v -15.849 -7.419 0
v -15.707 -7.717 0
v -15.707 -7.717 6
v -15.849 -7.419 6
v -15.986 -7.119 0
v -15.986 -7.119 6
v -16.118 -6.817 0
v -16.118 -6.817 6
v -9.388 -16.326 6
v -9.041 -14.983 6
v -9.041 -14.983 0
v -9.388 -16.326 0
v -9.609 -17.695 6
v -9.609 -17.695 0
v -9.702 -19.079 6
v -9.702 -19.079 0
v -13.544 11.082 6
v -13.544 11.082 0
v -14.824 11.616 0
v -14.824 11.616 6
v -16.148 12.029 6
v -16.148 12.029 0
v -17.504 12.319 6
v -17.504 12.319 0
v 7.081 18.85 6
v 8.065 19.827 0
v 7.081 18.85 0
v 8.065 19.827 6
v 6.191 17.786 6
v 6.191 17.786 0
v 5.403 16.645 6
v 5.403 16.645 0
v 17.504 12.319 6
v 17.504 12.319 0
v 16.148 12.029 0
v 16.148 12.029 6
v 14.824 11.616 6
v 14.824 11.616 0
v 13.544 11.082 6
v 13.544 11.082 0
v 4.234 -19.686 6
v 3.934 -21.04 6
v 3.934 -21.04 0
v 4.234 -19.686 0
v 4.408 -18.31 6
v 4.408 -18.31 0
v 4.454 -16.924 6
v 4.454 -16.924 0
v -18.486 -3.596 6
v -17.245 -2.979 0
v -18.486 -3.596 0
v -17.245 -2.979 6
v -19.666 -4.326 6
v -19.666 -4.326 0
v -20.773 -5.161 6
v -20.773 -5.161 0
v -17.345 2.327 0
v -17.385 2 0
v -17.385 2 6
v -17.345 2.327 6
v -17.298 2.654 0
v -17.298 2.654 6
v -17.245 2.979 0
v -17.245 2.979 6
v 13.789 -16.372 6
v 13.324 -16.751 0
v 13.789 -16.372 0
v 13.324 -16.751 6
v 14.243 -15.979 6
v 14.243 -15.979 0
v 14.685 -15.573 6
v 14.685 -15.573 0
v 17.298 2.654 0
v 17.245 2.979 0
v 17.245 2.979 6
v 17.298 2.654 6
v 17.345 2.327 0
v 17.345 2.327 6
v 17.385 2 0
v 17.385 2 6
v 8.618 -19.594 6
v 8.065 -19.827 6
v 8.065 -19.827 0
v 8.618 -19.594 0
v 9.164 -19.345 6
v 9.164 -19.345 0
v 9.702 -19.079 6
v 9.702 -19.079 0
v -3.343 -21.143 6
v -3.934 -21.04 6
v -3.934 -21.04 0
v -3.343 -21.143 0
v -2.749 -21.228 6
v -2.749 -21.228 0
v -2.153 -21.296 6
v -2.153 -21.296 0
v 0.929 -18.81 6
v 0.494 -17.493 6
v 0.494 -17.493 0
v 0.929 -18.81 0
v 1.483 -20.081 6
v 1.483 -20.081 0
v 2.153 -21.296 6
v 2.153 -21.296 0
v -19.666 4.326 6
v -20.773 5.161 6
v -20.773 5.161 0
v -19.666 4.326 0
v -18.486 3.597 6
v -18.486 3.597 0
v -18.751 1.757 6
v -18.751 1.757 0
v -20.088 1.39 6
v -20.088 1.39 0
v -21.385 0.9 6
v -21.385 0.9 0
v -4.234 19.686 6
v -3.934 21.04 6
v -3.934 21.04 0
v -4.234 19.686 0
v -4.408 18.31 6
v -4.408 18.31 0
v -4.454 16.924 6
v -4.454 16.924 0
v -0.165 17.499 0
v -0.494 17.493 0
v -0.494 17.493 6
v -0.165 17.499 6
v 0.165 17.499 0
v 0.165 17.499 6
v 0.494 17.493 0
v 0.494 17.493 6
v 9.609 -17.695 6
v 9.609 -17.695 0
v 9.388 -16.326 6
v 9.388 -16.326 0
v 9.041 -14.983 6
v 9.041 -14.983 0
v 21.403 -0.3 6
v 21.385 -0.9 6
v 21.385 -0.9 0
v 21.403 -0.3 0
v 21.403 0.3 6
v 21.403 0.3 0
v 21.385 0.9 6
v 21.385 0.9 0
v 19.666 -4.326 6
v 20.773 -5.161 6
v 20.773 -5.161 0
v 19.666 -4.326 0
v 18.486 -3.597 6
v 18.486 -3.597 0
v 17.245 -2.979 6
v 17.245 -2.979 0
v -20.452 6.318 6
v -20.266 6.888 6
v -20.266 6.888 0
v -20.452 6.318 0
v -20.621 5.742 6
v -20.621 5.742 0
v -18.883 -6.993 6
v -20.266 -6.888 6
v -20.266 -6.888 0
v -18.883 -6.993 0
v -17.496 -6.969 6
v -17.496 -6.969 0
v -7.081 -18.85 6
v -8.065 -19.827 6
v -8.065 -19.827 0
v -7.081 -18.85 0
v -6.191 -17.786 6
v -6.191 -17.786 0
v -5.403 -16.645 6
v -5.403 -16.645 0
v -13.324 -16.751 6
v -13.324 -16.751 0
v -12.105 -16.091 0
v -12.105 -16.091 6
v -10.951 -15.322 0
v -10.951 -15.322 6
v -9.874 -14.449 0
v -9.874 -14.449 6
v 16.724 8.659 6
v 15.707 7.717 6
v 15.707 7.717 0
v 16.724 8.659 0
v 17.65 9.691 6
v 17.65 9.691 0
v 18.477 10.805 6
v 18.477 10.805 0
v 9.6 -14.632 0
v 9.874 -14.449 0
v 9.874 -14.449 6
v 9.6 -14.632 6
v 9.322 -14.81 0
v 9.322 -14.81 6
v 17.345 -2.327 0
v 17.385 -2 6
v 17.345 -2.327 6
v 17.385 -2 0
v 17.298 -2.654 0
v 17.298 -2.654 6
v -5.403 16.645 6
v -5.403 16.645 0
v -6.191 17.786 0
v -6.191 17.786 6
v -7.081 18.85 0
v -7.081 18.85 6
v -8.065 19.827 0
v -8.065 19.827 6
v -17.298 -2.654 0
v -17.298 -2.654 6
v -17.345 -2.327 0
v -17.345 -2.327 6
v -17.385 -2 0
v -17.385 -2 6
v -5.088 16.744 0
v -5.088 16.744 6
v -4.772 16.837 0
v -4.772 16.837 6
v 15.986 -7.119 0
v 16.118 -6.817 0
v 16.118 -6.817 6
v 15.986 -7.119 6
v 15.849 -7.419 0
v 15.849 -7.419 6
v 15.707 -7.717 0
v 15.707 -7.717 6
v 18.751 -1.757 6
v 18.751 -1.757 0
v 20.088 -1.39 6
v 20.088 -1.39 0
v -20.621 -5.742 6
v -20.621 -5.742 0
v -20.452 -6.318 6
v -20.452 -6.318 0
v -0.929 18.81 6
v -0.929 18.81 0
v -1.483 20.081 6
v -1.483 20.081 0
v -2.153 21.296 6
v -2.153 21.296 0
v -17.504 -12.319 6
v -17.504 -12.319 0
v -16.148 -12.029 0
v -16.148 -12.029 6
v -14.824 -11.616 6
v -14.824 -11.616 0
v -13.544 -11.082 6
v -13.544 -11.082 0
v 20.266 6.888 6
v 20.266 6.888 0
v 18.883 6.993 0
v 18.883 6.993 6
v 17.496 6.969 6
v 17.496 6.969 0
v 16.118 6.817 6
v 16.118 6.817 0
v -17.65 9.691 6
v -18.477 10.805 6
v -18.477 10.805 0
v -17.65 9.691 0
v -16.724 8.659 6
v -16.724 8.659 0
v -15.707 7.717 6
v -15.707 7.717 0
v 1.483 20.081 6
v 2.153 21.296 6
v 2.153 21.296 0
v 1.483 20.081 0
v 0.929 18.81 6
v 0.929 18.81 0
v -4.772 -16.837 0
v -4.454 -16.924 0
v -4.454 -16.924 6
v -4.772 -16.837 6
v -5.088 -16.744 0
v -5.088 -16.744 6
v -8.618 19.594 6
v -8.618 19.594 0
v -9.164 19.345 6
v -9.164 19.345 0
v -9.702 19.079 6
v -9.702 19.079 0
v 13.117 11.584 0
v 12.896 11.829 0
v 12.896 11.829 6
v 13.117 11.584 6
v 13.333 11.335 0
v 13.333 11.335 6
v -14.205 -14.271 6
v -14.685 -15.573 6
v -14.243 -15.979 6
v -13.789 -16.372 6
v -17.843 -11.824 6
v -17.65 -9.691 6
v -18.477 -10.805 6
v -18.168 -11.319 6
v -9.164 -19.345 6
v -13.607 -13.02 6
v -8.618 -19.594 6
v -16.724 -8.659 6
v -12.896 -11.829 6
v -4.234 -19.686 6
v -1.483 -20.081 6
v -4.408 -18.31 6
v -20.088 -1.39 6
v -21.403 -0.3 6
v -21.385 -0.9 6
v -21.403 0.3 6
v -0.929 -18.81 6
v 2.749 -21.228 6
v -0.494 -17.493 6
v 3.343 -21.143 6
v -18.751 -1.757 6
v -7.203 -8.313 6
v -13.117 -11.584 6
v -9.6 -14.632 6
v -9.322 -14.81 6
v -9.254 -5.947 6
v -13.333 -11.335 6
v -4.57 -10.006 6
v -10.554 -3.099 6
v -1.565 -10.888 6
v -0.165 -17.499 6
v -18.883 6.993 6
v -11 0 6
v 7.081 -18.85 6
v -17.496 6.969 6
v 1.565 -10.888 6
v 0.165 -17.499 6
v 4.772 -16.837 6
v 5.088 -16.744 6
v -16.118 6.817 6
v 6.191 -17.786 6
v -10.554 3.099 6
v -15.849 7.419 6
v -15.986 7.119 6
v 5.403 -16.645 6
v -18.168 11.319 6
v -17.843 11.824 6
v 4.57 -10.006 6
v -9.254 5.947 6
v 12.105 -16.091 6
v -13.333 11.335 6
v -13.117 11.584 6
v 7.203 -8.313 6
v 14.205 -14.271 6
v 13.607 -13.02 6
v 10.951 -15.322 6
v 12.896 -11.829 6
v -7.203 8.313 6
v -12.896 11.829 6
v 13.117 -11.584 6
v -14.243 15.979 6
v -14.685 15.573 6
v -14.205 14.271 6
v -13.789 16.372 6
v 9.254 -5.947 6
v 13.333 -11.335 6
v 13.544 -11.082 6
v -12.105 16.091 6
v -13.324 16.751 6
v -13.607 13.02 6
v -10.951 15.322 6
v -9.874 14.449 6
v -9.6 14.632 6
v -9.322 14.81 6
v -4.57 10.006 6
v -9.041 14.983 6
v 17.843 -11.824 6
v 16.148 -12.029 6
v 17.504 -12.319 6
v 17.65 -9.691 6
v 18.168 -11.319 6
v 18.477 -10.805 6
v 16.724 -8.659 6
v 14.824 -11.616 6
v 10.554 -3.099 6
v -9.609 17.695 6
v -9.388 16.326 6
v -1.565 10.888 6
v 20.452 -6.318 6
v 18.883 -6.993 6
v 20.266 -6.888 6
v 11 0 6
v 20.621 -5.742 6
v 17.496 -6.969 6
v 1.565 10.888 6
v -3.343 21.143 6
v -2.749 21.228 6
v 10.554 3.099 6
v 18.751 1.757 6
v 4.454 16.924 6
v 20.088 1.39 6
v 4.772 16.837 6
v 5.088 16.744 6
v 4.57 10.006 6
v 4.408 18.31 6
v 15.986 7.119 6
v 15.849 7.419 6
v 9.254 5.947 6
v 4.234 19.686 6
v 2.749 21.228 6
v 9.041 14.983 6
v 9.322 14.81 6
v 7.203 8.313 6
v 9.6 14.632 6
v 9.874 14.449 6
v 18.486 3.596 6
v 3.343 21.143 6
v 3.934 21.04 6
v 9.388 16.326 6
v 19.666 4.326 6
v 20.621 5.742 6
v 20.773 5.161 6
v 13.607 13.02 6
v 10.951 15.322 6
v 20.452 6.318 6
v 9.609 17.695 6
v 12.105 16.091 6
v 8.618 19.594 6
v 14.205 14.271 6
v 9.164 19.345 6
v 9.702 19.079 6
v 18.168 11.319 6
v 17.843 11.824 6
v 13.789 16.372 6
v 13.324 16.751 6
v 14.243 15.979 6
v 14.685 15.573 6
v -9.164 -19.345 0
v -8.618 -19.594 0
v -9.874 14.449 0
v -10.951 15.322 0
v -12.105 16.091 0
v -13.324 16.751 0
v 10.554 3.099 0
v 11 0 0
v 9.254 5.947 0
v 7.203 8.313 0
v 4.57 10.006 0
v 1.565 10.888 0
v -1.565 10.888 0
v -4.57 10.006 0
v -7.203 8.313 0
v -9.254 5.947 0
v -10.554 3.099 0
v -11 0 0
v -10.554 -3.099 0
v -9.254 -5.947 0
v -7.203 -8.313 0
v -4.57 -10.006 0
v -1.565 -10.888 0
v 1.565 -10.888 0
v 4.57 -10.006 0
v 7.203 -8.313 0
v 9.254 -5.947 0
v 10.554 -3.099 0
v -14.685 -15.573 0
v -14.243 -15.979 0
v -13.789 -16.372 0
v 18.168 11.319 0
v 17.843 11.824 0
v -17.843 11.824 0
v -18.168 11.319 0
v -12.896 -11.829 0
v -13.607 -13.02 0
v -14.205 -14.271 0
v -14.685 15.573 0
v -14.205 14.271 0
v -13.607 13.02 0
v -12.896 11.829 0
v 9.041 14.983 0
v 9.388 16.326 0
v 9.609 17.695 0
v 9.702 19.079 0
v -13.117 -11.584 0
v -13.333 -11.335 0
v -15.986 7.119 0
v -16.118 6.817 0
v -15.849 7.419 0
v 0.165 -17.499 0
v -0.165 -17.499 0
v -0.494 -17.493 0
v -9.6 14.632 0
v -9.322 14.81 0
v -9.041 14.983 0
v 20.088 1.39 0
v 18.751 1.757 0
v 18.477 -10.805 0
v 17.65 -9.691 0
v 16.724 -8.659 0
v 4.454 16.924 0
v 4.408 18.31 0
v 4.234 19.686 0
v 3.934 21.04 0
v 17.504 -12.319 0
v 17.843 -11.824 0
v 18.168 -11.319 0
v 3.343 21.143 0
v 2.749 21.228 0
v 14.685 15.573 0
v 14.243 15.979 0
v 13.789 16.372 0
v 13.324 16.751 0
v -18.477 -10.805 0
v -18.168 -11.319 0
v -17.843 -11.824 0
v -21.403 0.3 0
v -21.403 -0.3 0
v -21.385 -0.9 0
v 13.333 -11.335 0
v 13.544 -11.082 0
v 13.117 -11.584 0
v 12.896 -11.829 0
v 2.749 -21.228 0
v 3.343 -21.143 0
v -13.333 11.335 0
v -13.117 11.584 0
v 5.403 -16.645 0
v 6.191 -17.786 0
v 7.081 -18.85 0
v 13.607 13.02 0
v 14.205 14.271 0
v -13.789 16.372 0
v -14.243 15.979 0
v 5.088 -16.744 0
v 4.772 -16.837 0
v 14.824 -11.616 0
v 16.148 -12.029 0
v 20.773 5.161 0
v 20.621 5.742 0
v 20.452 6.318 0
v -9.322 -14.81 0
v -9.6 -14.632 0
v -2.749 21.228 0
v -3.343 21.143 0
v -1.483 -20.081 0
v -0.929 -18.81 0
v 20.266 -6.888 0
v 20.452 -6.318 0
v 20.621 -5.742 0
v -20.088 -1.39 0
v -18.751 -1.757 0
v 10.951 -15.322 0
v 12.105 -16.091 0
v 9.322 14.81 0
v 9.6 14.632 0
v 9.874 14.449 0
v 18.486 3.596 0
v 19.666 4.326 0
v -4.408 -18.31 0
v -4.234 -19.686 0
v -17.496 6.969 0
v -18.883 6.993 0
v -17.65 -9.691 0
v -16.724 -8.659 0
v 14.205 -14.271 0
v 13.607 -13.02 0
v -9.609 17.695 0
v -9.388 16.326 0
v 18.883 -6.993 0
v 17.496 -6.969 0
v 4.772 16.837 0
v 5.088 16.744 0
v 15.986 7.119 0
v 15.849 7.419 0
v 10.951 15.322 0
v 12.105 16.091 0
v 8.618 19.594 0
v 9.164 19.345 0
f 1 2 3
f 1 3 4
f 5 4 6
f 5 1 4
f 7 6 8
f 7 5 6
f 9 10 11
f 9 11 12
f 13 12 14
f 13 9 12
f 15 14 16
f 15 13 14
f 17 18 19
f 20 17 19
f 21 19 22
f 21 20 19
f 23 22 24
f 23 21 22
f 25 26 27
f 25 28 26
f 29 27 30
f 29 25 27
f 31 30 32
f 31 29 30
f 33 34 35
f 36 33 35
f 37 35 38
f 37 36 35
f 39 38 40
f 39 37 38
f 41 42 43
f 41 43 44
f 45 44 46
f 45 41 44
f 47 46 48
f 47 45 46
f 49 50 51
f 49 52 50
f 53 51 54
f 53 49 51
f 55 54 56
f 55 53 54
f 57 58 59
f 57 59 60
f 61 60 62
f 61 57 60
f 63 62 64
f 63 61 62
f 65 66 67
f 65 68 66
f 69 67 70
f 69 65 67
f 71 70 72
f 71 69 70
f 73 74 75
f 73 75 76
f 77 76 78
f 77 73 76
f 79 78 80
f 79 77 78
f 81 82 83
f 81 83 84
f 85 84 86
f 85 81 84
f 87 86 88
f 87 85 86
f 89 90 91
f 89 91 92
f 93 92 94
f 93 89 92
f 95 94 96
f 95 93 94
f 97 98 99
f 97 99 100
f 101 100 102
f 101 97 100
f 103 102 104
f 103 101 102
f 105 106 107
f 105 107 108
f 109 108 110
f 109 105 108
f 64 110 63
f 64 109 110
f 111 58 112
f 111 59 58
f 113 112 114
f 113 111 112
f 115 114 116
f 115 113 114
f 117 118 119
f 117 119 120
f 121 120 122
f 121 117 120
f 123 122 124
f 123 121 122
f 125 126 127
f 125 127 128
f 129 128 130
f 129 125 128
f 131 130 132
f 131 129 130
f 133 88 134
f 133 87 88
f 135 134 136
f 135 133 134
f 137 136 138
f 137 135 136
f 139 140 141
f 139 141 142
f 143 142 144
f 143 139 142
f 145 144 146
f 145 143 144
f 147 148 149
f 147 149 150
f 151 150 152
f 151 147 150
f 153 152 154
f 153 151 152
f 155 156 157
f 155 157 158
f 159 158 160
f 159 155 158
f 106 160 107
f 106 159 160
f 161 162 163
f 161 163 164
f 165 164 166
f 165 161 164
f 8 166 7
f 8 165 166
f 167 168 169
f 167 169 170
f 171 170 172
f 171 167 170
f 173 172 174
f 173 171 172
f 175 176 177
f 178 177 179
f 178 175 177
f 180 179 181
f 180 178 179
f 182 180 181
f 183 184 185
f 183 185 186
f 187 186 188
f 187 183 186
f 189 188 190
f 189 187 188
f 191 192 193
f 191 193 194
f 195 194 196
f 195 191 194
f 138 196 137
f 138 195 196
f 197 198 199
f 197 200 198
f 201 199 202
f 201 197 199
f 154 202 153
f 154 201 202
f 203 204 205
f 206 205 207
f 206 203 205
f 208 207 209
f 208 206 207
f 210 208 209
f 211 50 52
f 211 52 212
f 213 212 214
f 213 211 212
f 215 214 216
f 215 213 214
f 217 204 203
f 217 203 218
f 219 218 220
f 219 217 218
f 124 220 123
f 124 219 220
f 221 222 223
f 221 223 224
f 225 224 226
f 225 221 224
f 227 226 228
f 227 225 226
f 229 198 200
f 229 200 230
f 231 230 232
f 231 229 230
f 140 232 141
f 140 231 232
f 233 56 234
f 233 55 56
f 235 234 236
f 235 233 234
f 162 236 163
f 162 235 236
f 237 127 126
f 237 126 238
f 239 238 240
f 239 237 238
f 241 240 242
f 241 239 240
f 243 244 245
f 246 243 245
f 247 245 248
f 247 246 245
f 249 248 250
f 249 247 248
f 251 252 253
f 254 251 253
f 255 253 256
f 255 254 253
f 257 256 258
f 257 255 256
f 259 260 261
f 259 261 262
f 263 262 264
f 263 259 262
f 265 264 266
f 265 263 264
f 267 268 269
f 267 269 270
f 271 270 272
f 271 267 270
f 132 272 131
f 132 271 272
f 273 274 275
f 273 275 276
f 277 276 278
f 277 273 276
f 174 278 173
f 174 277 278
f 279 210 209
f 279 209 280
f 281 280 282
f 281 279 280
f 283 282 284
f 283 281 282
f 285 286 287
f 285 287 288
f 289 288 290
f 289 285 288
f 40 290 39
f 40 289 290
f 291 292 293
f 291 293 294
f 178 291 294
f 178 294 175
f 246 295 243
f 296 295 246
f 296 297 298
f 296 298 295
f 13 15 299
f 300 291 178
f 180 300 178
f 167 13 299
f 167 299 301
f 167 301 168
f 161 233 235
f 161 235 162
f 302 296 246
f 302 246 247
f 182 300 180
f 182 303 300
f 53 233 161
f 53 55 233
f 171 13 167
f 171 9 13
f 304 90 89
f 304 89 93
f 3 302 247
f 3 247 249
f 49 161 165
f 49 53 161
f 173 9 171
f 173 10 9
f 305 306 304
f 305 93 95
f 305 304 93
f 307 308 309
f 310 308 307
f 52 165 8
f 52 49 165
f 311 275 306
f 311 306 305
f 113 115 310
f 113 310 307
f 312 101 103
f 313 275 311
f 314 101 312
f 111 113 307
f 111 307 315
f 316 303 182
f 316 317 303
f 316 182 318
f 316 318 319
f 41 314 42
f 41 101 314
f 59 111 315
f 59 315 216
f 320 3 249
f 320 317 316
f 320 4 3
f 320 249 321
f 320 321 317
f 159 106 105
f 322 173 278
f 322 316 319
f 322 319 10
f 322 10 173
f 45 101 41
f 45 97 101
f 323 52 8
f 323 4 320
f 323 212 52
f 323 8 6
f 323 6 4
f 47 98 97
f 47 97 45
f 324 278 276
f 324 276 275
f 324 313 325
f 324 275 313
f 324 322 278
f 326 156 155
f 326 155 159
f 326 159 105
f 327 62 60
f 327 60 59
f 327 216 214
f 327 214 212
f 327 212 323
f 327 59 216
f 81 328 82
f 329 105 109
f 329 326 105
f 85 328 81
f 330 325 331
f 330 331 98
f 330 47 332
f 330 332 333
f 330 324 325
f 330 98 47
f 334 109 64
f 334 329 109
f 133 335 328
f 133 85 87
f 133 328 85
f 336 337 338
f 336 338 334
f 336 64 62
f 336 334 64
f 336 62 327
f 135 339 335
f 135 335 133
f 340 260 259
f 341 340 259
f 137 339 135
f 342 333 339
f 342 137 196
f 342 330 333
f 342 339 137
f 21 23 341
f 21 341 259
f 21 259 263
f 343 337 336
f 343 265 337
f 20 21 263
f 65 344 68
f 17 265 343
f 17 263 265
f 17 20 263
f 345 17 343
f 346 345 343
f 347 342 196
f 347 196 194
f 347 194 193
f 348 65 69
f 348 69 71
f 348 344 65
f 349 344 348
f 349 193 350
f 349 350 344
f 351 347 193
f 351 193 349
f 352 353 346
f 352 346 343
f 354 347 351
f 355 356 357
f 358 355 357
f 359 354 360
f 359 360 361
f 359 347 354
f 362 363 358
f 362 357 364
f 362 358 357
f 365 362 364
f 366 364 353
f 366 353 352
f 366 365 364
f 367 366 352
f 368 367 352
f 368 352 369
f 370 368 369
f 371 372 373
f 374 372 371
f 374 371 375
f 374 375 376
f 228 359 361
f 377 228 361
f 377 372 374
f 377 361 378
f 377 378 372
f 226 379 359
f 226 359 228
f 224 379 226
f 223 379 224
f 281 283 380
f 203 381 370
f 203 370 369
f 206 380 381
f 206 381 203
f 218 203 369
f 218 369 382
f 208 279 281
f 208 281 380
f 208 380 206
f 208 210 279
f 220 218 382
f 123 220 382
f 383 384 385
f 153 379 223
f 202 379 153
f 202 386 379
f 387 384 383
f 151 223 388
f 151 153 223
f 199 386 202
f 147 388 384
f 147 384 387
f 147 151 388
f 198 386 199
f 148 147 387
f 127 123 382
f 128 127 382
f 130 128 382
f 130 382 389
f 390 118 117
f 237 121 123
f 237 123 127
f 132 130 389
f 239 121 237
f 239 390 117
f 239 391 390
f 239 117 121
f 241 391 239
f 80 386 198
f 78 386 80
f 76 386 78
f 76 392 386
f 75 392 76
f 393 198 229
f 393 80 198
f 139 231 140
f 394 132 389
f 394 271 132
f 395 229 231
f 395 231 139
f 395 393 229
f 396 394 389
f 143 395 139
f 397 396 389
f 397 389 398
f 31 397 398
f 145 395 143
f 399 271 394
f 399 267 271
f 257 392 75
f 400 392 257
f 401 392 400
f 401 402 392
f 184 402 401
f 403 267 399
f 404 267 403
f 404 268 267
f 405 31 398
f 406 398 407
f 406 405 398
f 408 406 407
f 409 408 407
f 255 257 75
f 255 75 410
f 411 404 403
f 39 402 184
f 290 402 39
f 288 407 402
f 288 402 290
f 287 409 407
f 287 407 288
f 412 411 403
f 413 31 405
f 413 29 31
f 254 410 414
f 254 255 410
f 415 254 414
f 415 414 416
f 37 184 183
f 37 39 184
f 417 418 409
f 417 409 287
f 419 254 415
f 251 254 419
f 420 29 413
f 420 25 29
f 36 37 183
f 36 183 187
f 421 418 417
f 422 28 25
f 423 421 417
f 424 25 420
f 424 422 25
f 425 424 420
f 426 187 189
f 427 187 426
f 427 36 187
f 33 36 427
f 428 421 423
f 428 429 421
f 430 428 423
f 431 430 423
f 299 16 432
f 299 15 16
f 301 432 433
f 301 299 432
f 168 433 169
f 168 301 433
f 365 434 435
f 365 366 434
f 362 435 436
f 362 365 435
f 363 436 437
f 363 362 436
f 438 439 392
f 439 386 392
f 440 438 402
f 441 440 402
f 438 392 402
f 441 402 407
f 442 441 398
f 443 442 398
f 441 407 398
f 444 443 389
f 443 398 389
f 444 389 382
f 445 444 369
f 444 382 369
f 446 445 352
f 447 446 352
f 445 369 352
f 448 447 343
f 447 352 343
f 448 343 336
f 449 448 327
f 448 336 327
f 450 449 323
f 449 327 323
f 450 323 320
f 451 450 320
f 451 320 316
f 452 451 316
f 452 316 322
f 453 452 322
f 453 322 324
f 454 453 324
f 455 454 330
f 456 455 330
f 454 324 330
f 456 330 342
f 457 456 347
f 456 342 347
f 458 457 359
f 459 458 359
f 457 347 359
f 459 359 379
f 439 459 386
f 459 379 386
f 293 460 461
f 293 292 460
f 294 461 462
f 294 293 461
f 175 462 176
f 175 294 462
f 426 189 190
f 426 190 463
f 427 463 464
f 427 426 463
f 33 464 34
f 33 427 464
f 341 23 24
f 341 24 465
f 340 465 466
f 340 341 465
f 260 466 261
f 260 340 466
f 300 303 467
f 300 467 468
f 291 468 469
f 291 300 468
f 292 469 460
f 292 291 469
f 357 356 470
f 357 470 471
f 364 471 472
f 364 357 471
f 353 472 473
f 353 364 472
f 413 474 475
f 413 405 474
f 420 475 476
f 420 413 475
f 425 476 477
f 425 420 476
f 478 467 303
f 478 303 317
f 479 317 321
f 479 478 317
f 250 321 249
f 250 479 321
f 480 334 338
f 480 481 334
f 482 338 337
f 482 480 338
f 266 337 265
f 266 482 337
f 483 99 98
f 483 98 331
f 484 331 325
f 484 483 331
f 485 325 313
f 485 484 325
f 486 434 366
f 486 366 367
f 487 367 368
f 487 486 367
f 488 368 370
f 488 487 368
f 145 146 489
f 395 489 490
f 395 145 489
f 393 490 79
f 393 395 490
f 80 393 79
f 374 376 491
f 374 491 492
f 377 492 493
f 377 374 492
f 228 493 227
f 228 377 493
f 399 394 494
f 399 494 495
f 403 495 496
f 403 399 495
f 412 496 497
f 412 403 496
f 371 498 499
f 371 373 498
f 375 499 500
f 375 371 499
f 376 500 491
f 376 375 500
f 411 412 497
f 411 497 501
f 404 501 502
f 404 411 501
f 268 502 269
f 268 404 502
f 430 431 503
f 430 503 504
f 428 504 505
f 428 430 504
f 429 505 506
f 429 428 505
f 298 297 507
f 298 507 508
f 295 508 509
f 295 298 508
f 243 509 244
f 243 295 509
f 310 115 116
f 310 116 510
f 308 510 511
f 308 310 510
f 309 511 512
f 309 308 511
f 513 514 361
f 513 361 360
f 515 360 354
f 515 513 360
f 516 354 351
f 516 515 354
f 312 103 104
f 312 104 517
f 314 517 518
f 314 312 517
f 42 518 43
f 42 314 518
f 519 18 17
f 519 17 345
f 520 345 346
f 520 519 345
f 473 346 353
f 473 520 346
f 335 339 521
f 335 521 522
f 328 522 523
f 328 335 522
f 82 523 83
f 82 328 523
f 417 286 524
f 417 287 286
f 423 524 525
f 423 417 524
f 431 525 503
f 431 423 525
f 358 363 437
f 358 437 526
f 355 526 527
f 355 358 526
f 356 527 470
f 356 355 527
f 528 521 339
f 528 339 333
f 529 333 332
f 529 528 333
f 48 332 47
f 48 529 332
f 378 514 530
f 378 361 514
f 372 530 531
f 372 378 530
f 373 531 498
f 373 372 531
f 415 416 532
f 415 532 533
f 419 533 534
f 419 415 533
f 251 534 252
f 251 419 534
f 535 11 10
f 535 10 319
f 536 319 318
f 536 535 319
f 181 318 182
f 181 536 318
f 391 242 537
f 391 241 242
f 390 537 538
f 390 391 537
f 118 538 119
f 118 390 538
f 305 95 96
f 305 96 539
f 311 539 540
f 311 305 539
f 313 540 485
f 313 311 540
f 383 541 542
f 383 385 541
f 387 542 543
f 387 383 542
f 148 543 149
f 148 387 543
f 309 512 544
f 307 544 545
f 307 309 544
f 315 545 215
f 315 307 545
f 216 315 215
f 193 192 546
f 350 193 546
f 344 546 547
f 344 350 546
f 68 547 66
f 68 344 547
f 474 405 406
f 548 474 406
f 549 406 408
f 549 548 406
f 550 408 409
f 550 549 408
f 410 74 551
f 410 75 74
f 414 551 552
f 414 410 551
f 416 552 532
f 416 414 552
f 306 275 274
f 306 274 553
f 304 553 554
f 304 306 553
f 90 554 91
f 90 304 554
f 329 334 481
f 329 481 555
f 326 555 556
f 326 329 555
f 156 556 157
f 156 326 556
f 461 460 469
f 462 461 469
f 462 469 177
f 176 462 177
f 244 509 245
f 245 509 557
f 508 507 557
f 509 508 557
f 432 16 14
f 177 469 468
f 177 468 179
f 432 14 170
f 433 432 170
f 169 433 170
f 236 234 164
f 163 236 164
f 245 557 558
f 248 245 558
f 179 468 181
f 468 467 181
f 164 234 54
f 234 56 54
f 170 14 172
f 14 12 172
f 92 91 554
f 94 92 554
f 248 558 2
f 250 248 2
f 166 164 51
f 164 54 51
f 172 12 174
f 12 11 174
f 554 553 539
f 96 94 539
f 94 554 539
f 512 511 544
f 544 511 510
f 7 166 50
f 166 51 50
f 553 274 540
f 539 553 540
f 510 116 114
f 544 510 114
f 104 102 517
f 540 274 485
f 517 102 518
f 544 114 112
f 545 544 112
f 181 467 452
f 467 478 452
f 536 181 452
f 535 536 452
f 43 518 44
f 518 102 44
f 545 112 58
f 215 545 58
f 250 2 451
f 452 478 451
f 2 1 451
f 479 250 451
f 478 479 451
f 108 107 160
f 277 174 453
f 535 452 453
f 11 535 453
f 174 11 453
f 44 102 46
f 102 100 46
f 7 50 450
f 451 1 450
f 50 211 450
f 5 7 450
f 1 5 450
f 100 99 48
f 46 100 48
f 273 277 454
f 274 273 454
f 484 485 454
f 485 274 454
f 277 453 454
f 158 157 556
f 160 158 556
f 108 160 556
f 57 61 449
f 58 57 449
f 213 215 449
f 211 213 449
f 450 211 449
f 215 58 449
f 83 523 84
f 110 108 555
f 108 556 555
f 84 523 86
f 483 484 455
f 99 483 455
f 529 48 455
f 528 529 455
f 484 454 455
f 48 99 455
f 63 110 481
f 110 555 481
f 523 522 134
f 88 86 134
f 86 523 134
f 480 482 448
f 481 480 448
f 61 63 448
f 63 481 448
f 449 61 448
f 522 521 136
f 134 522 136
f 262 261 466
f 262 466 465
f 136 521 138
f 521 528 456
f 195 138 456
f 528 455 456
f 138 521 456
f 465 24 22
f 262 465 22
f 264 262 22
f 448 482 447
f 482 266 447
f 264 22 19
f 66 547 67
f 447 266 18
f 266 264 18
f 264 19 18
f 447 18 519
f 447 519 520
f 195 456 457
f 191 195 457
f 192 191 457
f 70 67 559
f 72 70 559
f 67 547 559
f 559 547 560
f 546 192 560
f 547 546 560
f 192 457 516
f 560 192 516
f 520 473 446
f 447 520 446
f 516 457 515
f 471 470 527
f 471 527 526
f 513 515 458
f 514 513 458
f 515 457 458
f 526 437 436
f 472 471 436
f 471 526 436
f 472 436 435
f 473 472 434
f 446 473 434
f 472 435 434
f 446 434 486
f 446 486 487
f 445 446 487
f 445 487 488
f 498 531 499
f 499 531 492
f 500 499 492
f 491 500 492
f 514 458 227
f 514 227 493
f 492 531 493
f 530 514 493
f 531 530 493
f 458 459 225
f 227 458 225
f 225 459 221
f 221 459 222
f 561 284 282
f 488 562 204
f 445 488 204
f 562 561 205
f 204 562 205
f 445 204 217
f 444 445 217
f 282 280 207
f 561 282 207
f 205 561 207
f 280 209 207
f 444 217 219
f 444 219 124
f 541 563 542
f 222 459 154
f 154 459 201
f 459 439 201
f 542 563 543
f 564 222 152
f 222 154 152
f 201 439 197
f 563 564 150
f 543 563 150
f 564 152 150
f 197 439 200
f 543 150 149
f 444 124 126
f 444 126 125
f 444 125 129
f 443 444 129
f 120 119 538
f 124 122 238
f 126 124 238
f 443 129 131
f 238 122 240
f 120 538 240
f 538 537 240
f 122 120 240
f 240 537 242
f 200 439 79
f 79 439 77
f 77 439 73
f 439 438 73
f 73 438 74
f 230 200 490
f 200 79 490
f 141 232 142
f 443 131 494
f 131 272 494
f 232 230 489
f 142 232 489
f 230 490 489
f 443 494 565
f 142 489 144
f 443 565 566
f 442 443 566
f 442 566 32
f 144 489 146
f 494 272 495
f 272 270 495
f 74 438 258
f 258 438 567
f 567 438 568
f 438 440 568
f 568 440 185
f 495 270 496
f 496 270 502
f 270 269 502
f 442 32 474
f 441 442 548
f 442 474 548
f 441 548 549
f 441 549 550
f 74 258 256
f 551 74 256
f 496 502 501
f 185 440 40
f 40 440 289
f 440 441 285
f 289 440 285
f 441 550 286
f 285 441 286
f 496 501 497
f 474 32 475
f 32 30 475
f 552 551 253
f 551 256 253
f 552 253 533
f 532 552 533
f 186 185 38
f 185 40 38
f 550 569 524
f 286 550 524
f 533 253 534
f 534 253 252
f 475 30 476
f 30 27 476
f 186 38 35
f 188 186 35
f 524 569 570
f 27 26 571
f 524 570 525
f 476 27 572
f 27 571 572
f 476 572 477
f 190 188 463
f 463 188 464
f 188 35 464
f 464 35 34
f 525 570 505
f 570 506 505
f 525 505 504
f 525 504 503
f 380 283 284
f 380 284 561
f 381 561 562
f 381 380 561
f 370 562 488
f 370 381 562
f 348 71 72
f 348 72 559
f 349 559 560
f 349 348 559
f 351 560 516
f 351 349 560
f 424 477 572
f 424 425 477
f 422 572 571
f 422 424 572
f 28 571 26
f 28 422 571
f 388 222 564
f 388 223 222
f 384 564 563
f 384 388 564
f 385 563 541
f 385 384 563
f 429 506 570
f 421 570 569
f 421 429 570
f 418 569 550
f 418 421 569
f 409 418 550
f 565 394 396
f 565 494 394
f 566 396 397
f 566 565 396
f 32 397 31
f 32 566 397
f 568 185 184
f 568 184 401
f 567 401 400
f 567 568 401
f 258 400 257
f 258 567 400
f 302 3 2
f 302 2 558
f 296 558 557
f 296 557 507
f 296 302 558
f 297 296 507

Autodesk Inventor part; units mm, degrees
ref_plane "YZ Plane" through (0, 0, 0) normal (1, 0, 0) x (0, 1, 0)
ref_plane "XZ Plane" through (0, 0, 0) normal (0, 1, 0) x (-1, 0, 0)
ref_plane "XY Plane" through (0, 0, 0) normal (0, 0, 1) x (1, 0, 0)
sketch "Sketch1" plane through (0, 0, 0) normal (0, 0, 1) x (1, 0, 0)
  circle A0 centre (0, 0) radius 17.5
  dimension "d0" = 35
extrude "Extrusion1" add sketch "Sketch1" along normal blind 6
sketch "Sketch7" plane through (0, 0, 6) normal (0, 0, 1) x (1, 0, 0)
  circle A0 centre (0, 0) radius 17.5 construction
  line L0 (0, 0) -> (15, 0) construction
  circle A1 centre (0, 0) radius 17.5 projected
  arc A2 (21.3853, 0.9) -> (17.3853, 2) centre (15.4462, -12.8741) ccw
  arc A3 (21.3853, -0.9) -> (21.3853, 0.9) centre (1.4056, 0) ccw
  arc A4 (17.3853, -2) -> (21.3853, -0.9) centre (15.4462, 12.8741) ccw
  arc A5 (17.3853, -2) -> (17.3853, 2) centre (0, 0) ccw
  arc A6 (20.2655, 6.8885) -> (16.1176, 6.817) centre (18.4476, -8.0009) ccw
  arc A7 (17.2446, 2.979) -> (16.1176, 6.817) centre (0, 0) ccw
  arc A8 (17.2446, 2.979) -> (20.7726, 5.1614) centre (11.1935, 16.7043) ccw
  arc A9 (20.7726, 5.1614) -> (20.2655, 6.8885) centre (1.3487, 0.396) ccw
  arc A10 (17.5039, 12.3189) -> (13.5442, 11.0817) centre (19.9545, -2.4796) ccw
  arc A11 (15.7068, 7.7167) -> (13.5442, 11.0817) centre (0, 0) ccw
  arc A12 (15.7068, 7.7167) -> (18.4771, 10.8047) centre (6.0339, 19.1813) ccw
  arc A13 (18.4771, 10.8047) -> (17.5039, 12.3189) centre (1.1825, 0.7599) ccw
  arc A14 (13.3242, 16.7513) -> (9.8735, 14.4487) centre (19.8447, 3.2427) ccw
  arc A15 (12.8965, 11.8292) -> (9.8735, 14.4487) centre (0, 0) ccw
  arc A16 (12.8965, 11.8292) -> (14.6846, 15.5726) centre (0.3855, 20.1042) ccw
  arc A17 (14.6846, 15.5726) -> (13.3242, 16.7513) centre (0.9205, 1.0623) ccw
  arc A18 (8.0651, 19.8267) -> (5.4029, 16.6451) centre (18.1273, 8.7023) ccw
  arc A19 (9.0414, 14.9834) -> (5.4029, 16.6451) centre (0, 0) ccw
  arc A20 (9.0414, 14.9834) -> (9.7025, 19.0789) centre (-5.2941, 19.3985) ccw
  arc A21 (9.7025, 19.0789) -> (8.0651, 19.8267) centre (0.5839, 1.2786) ccw
  arc A22 (2.1526, 21.2958) -> (0.4945, 17.493) centre (14.9413, 13.4568) ccw
  arc A23 (4.4538, 16.9238) -> (0.4945, 17.493) centre (0, 0) ccw
  arc A24 (4.4538, 16.9238) -> (3.9343, 21.0396) centre (-10.5449, 17.1212) ccw
  arc A25 (3.9343, 21.0396) -> (2.1526, 21.2958) centre (0.2, 1.3913) ccw
  arc A26 (-3.9343, 21.0396) -> (-4.4538, 16.9238) centre (10.5449, 17.1212) ccw
  arc A27 (-0.4945, 17.493) -> (-4.4538, 16.9238) centre (0, 0) ccw
  arc A28 (-0.4945, 17.493) -> (-2.1526, 21.2958) centre (-14.9413, 13.4568) ccw
  arc A29 (-2.1526, 21.2958) -> (-3.9343, 21.0396) centre (-0.2, 1.3913) ccw
  arc A30 (-9.7025, 19.0789) -> (-9.0414, 14.9834) centre (5.2941, 19.3985) ccw
  arc A31 (-5.4029, 16.6451) -> (-9.0414, 14.9834) centre (0, 0) ccw
  arc A32 (-5.4029, 16.6451) -> (-8.0651, 19.8267) centre (-18.1273, 8.7023) ccw
  arc A33 (-8.0651, 19.8267) -> (-9.7025, 19.0789) centre (-0.5839, 1.2786) ccw
  arc A34 (-14.6846, 15.5726) -> (-12.8965, 11.8292) centre (-0.3855, 20.1042) ccw
  arc A35 (-9.8735, 14.4487) -> (-12.8965, 11.8292) centre (0, 0) ccw
  arc A36 (-9.8735, 14.4487) -> (-13.3242, 16.7513) centre (-19.8447, 3.2427) ccw
  arc A37 (-13.3242, 16.7513) -> (-14.6846, 15.5726) centre (-0.9205, 1.0623) ccw
  arc A38 (-18.4771, 10.8047) -> (-15.7068, 7.7167) centre (-6.0339, 19.1813) ccw
  arc A39 (-13.5442, 11.0817) -> (-15.7068, 7.7167) centre (0, 0) ccw
  arc A40 (-13.5442, 11.0817) -> (-17.5039, 12.3189) centre (-19.9545, -2.4796) ccw
  arc A41 (-17.5039, 12.3189) -> (-18.4771, 10.8047) centre (-1.1825, 0.7599) ccw
  arc A42 (-20.7726, 5.1614) -> (-17.2446, 2.979) centre (-11.1935, 16.7043) ccw
  arc A43 (-16.1176, 6.817) -> (-17.2446, 2.979) centre (0, 0) ccw
  arc A44 (-16.1176, 6.817) -> (-20.2655, 6.8885) centre (-18.4476, -8.0009) ccw
  arc A45 (-20.2655, 6.8885) -> (-20.7726, 5.1614) centre (-1.3487, 0.396) ccw
  arc A46 (-21.3853, -0.9) -> (-17.3853, -2) centre (-15.4462, 12.8741) ccw
  arc A47 (-17.3853, 2) -> (-17.3853, -2) centre (0, 0) ccw
  arc A48 (-17.3853, 2) -> (-21.3853, 0.9) centre (-15.4462, -12.8741) ccw
  arc A49 (-21.3853, 0.9) -> (-21.3853, -0.9) centre (-1.4056, 0) ccw
  arc A50 (-20.2655, -6.8885) -> (-16.1176, -6.817) centre (-18.4476, 8.0009) ccw
  arc A51 (-17.2446, -2.979) -> (-16.1176, -6.817) centre (0, 0) ccw
  arc A52 (-17.2446, -2.979) -> (-20.7726, -5.1614) centre (-11.1935, -16.7043) ccw
  arc A53 (-20.7726, -5.1614) -> (-20.2655, -6.8885) centre (-1.3487, -0.396) ccw
  arc A54 (-17.5039, -12.3189) -> (-13.5442, -11.0817) centre (-19.9545, 2.4796) ccw
  arc A55 (-15.7068, -7.7167) -> (-13.5442, -11.0817) centre (0, 0) ccw
  arc A56 (-15.7068, -7.7167) -> (-18.4771, -10.8047) centre (-6.0339, -19.1813) ccw
  arc A57 (-18.4771, -10.8047) -> (-17.5039, -12.3189) centre (-1.1825, -0.7599) ccw
  arc A58 (-13.3242, -16.7513) -> (-9.8735, -14.4487) centre (-19.8447, -3.2427) ccw
  arc A59 (-12.8965, -11.8292) -> (-9.8735, -14.4487) centre (0, 0) ccw
  arc A60 (-12.8965, -11.8292) -> (-14.6846, -15.5726) centre (-0.3855, -20.1042) ccw
  arc A61 (-14.6846, -15.5726) -> (-13.3242, -16.7513) centre (-0.9205, -1.0623) ccw
  arc A62 (-8.0651, -19.8267) -> (-5.4029, -16.6451) centre (-18.1273, -8.7023) ccw
  arc A63 (-9.0414, -14.9834) -> (-5.4029, -16.6451) centre (0, 0) ccw
  arc A64 (-9.0414, -14.9834) -> (-9.7025, -19.0789) centre (5.2941, -19.3985) ccw
  arc A65 (-9.7025, -19.0789) -> (-8.0651, -19.8267) centre (-0.5839, -1.2786) ccw
  arc A66 (-2.1526, -21.2958) -> (-0.4945, -17.493) centre (-14.9413, -13.4568) ccw
  arc A67 (-4.4538, -16.9238) -> (-0.4945, -17.493) centre (0, 0) ccw
  arc A68 (-4.4538, -16.9238) -> (-3.9343, -21.0396) centre (10.5449, -17.1212) ccw
  arc A69 (-3.9343, -21.0396) -> (-2.1526, -21.2958) centre (-0.2, -1.3913) ccw
  arc A70 (3.9343, -21.0396) -> (4.4538, -16.9238) centre (-10.5449, -17.1212) ccw
  arc A71 (0.4945, -17.493) -> (4.4538, -16.9238) centre (0, 0) ccw
  arc A72 (0.4945, -17.493) -> (2.1526, -21.2958) centre (14.9413, -13.4568) ccw
  arc A73 (2.1526, -21.2958) -> (3.9343, -21.0396) centre (0.2, -1.3913) ccw
  arc A74 (9.7025, -19.0789) -> (9.0414, -14.9834) centre (-5.2941, -19.3985) ccw
  arc A75 (5.4029, -16.6451) -> (9.0414, -14.9834) centre (0, 0) ccw
  arc A76 (5.4029, -16.6451) -> (8.0651, -19.8267) centre (18.1273, -8.7023) ccw
  arc A77 (8.0651, -19.8267) -> (9.7025, -19.0789) centre (0.5839, -1.2786) ccw
  arc A78 (14.6846, -15.5726) -> (12.8965, -11.8292) centre (0.3855, -20.1042) ccw
  arc A79 (9.8735, -14.4487) -> (12.8965, -11.8292) centre (0, 0) ccw
  arc A80 (9.8735, -14.4487) -> (13.3242, -16.7513) centre (19.8447, -3.2427) ccw
  arc A81 (13.3242, -16.7513) -> (14.6846, -15.5726) centre (0.9205, -1.0623) ccw
  arc A82 (18.4771, -10.8047) -> (15.7068, -7.7167) centre (6.0339, -19.1813) ccw
  arc A83 (13.5442, -11.0817) -> (15.7068, -7.7167) centre (0, 0) ccw
  arc A84 (13.5442, -11.0817) -> (17.5039, -12.3189) centre (19.9545, 2.4796) ccw
  arc A85 (17.5039, -12.3189) -> (18.4771, -10.8047) centre (1.1825, -0.7599) ccw
  arc A86 (20.7726, -5.1614) -> (17.2446, -2.979) centre (11.1935, -16.7043) ccw
  arc A87 (16.1176, -6.817) -> (17.2446, -2.979) centre (0, 0) ccw
  arc A88 (16.1176, -6.817) -> (20.2655, -6.8885) centre (18.4476, 8.0009) ccw
  arc A89 (20.2655, -6.8885) -> (20.7726, -5.1614) centre (1.3487, -0.396) ccw
  point P0 (21.4056, 0)
  point P1 (20.5385, 6.0307)
  point P2 (18.0075, 11.5727)
  point P3 (14.0177, 16.1773)
  point P4 (8.8922, 19.4712)
  point P5 (3.0463, 21.1877)
  point P6 (-3.0463, 21.1877)
  point P7 (-8.8922, 19.4712)
  point P8 (-14.0177, 16.1773)
  point P9 (-18.0075, 11.5727)
  point P10 (-20.5385, 6.0307)
  point P11 (-21.4056, 0)
  point P12 (-20.5385, -6.0307)
  point P13 (-18.0075, -11.5727)
  point P14 (-14.0177, -16.1773)
  point P15 (-8.8922, -19.4712)
  point P16 (-3.0463, -21.1877)
  point P17 (3.0463, -21.1877)
  point P18 (8.8922, -19.4712)
  point P19 (14.0177, -16.1773)
  point P20 (18.0075, -11.5727)
  point P21 (20.5385, -6.0307)
  dimension "d19" = 15
  dimension "d20" = 15
  dimension "d21" = 20
  dimension "d22" = 1.8
  dimension "d23" = 2
  dimension "d24" = 4
  dimension "d27" = 360
extrude "Extrusion7" add sketch "Sketch7" against normal blind 6 contours A1 A2 A3 A4 | A1 A6 A9 A8 | A86 A89 A88 A1 | A1 A10 A13 A12 | A82 A85 A84 A1 | A1 A14 A17 A16 | A78 A81 A80 A1 | A1 A18 A21 A20 | A74 A77 A76 A1 | A1 A22 A25 A24 | A70 A73 A72 A1 | A1 A26 A29 A28 | A66 A69 A68 A1 | A1 A30 A33 A32 | A62 A65 A64 A1 | A1 A34 A37 A36 | A58 A61 A60 A1 | A1 A38 A41 A40 | A54 A57 A56 A1 | A1 A42 A45 A44 | A50 A53 A52 A1 | A1 A46 A49 A48
sketch "Sketch9" plane through (0, 0, 6) normal (0, 0, 1) x (1, 0, 0)
  circle A0 centre (0, 0) radius 11
  dimension "d33" = 22
extrude "Extrusion9" cut sketch "Sketch9" against normal through all
properties part number "Motor Coupler" material "ABS Plastic"
